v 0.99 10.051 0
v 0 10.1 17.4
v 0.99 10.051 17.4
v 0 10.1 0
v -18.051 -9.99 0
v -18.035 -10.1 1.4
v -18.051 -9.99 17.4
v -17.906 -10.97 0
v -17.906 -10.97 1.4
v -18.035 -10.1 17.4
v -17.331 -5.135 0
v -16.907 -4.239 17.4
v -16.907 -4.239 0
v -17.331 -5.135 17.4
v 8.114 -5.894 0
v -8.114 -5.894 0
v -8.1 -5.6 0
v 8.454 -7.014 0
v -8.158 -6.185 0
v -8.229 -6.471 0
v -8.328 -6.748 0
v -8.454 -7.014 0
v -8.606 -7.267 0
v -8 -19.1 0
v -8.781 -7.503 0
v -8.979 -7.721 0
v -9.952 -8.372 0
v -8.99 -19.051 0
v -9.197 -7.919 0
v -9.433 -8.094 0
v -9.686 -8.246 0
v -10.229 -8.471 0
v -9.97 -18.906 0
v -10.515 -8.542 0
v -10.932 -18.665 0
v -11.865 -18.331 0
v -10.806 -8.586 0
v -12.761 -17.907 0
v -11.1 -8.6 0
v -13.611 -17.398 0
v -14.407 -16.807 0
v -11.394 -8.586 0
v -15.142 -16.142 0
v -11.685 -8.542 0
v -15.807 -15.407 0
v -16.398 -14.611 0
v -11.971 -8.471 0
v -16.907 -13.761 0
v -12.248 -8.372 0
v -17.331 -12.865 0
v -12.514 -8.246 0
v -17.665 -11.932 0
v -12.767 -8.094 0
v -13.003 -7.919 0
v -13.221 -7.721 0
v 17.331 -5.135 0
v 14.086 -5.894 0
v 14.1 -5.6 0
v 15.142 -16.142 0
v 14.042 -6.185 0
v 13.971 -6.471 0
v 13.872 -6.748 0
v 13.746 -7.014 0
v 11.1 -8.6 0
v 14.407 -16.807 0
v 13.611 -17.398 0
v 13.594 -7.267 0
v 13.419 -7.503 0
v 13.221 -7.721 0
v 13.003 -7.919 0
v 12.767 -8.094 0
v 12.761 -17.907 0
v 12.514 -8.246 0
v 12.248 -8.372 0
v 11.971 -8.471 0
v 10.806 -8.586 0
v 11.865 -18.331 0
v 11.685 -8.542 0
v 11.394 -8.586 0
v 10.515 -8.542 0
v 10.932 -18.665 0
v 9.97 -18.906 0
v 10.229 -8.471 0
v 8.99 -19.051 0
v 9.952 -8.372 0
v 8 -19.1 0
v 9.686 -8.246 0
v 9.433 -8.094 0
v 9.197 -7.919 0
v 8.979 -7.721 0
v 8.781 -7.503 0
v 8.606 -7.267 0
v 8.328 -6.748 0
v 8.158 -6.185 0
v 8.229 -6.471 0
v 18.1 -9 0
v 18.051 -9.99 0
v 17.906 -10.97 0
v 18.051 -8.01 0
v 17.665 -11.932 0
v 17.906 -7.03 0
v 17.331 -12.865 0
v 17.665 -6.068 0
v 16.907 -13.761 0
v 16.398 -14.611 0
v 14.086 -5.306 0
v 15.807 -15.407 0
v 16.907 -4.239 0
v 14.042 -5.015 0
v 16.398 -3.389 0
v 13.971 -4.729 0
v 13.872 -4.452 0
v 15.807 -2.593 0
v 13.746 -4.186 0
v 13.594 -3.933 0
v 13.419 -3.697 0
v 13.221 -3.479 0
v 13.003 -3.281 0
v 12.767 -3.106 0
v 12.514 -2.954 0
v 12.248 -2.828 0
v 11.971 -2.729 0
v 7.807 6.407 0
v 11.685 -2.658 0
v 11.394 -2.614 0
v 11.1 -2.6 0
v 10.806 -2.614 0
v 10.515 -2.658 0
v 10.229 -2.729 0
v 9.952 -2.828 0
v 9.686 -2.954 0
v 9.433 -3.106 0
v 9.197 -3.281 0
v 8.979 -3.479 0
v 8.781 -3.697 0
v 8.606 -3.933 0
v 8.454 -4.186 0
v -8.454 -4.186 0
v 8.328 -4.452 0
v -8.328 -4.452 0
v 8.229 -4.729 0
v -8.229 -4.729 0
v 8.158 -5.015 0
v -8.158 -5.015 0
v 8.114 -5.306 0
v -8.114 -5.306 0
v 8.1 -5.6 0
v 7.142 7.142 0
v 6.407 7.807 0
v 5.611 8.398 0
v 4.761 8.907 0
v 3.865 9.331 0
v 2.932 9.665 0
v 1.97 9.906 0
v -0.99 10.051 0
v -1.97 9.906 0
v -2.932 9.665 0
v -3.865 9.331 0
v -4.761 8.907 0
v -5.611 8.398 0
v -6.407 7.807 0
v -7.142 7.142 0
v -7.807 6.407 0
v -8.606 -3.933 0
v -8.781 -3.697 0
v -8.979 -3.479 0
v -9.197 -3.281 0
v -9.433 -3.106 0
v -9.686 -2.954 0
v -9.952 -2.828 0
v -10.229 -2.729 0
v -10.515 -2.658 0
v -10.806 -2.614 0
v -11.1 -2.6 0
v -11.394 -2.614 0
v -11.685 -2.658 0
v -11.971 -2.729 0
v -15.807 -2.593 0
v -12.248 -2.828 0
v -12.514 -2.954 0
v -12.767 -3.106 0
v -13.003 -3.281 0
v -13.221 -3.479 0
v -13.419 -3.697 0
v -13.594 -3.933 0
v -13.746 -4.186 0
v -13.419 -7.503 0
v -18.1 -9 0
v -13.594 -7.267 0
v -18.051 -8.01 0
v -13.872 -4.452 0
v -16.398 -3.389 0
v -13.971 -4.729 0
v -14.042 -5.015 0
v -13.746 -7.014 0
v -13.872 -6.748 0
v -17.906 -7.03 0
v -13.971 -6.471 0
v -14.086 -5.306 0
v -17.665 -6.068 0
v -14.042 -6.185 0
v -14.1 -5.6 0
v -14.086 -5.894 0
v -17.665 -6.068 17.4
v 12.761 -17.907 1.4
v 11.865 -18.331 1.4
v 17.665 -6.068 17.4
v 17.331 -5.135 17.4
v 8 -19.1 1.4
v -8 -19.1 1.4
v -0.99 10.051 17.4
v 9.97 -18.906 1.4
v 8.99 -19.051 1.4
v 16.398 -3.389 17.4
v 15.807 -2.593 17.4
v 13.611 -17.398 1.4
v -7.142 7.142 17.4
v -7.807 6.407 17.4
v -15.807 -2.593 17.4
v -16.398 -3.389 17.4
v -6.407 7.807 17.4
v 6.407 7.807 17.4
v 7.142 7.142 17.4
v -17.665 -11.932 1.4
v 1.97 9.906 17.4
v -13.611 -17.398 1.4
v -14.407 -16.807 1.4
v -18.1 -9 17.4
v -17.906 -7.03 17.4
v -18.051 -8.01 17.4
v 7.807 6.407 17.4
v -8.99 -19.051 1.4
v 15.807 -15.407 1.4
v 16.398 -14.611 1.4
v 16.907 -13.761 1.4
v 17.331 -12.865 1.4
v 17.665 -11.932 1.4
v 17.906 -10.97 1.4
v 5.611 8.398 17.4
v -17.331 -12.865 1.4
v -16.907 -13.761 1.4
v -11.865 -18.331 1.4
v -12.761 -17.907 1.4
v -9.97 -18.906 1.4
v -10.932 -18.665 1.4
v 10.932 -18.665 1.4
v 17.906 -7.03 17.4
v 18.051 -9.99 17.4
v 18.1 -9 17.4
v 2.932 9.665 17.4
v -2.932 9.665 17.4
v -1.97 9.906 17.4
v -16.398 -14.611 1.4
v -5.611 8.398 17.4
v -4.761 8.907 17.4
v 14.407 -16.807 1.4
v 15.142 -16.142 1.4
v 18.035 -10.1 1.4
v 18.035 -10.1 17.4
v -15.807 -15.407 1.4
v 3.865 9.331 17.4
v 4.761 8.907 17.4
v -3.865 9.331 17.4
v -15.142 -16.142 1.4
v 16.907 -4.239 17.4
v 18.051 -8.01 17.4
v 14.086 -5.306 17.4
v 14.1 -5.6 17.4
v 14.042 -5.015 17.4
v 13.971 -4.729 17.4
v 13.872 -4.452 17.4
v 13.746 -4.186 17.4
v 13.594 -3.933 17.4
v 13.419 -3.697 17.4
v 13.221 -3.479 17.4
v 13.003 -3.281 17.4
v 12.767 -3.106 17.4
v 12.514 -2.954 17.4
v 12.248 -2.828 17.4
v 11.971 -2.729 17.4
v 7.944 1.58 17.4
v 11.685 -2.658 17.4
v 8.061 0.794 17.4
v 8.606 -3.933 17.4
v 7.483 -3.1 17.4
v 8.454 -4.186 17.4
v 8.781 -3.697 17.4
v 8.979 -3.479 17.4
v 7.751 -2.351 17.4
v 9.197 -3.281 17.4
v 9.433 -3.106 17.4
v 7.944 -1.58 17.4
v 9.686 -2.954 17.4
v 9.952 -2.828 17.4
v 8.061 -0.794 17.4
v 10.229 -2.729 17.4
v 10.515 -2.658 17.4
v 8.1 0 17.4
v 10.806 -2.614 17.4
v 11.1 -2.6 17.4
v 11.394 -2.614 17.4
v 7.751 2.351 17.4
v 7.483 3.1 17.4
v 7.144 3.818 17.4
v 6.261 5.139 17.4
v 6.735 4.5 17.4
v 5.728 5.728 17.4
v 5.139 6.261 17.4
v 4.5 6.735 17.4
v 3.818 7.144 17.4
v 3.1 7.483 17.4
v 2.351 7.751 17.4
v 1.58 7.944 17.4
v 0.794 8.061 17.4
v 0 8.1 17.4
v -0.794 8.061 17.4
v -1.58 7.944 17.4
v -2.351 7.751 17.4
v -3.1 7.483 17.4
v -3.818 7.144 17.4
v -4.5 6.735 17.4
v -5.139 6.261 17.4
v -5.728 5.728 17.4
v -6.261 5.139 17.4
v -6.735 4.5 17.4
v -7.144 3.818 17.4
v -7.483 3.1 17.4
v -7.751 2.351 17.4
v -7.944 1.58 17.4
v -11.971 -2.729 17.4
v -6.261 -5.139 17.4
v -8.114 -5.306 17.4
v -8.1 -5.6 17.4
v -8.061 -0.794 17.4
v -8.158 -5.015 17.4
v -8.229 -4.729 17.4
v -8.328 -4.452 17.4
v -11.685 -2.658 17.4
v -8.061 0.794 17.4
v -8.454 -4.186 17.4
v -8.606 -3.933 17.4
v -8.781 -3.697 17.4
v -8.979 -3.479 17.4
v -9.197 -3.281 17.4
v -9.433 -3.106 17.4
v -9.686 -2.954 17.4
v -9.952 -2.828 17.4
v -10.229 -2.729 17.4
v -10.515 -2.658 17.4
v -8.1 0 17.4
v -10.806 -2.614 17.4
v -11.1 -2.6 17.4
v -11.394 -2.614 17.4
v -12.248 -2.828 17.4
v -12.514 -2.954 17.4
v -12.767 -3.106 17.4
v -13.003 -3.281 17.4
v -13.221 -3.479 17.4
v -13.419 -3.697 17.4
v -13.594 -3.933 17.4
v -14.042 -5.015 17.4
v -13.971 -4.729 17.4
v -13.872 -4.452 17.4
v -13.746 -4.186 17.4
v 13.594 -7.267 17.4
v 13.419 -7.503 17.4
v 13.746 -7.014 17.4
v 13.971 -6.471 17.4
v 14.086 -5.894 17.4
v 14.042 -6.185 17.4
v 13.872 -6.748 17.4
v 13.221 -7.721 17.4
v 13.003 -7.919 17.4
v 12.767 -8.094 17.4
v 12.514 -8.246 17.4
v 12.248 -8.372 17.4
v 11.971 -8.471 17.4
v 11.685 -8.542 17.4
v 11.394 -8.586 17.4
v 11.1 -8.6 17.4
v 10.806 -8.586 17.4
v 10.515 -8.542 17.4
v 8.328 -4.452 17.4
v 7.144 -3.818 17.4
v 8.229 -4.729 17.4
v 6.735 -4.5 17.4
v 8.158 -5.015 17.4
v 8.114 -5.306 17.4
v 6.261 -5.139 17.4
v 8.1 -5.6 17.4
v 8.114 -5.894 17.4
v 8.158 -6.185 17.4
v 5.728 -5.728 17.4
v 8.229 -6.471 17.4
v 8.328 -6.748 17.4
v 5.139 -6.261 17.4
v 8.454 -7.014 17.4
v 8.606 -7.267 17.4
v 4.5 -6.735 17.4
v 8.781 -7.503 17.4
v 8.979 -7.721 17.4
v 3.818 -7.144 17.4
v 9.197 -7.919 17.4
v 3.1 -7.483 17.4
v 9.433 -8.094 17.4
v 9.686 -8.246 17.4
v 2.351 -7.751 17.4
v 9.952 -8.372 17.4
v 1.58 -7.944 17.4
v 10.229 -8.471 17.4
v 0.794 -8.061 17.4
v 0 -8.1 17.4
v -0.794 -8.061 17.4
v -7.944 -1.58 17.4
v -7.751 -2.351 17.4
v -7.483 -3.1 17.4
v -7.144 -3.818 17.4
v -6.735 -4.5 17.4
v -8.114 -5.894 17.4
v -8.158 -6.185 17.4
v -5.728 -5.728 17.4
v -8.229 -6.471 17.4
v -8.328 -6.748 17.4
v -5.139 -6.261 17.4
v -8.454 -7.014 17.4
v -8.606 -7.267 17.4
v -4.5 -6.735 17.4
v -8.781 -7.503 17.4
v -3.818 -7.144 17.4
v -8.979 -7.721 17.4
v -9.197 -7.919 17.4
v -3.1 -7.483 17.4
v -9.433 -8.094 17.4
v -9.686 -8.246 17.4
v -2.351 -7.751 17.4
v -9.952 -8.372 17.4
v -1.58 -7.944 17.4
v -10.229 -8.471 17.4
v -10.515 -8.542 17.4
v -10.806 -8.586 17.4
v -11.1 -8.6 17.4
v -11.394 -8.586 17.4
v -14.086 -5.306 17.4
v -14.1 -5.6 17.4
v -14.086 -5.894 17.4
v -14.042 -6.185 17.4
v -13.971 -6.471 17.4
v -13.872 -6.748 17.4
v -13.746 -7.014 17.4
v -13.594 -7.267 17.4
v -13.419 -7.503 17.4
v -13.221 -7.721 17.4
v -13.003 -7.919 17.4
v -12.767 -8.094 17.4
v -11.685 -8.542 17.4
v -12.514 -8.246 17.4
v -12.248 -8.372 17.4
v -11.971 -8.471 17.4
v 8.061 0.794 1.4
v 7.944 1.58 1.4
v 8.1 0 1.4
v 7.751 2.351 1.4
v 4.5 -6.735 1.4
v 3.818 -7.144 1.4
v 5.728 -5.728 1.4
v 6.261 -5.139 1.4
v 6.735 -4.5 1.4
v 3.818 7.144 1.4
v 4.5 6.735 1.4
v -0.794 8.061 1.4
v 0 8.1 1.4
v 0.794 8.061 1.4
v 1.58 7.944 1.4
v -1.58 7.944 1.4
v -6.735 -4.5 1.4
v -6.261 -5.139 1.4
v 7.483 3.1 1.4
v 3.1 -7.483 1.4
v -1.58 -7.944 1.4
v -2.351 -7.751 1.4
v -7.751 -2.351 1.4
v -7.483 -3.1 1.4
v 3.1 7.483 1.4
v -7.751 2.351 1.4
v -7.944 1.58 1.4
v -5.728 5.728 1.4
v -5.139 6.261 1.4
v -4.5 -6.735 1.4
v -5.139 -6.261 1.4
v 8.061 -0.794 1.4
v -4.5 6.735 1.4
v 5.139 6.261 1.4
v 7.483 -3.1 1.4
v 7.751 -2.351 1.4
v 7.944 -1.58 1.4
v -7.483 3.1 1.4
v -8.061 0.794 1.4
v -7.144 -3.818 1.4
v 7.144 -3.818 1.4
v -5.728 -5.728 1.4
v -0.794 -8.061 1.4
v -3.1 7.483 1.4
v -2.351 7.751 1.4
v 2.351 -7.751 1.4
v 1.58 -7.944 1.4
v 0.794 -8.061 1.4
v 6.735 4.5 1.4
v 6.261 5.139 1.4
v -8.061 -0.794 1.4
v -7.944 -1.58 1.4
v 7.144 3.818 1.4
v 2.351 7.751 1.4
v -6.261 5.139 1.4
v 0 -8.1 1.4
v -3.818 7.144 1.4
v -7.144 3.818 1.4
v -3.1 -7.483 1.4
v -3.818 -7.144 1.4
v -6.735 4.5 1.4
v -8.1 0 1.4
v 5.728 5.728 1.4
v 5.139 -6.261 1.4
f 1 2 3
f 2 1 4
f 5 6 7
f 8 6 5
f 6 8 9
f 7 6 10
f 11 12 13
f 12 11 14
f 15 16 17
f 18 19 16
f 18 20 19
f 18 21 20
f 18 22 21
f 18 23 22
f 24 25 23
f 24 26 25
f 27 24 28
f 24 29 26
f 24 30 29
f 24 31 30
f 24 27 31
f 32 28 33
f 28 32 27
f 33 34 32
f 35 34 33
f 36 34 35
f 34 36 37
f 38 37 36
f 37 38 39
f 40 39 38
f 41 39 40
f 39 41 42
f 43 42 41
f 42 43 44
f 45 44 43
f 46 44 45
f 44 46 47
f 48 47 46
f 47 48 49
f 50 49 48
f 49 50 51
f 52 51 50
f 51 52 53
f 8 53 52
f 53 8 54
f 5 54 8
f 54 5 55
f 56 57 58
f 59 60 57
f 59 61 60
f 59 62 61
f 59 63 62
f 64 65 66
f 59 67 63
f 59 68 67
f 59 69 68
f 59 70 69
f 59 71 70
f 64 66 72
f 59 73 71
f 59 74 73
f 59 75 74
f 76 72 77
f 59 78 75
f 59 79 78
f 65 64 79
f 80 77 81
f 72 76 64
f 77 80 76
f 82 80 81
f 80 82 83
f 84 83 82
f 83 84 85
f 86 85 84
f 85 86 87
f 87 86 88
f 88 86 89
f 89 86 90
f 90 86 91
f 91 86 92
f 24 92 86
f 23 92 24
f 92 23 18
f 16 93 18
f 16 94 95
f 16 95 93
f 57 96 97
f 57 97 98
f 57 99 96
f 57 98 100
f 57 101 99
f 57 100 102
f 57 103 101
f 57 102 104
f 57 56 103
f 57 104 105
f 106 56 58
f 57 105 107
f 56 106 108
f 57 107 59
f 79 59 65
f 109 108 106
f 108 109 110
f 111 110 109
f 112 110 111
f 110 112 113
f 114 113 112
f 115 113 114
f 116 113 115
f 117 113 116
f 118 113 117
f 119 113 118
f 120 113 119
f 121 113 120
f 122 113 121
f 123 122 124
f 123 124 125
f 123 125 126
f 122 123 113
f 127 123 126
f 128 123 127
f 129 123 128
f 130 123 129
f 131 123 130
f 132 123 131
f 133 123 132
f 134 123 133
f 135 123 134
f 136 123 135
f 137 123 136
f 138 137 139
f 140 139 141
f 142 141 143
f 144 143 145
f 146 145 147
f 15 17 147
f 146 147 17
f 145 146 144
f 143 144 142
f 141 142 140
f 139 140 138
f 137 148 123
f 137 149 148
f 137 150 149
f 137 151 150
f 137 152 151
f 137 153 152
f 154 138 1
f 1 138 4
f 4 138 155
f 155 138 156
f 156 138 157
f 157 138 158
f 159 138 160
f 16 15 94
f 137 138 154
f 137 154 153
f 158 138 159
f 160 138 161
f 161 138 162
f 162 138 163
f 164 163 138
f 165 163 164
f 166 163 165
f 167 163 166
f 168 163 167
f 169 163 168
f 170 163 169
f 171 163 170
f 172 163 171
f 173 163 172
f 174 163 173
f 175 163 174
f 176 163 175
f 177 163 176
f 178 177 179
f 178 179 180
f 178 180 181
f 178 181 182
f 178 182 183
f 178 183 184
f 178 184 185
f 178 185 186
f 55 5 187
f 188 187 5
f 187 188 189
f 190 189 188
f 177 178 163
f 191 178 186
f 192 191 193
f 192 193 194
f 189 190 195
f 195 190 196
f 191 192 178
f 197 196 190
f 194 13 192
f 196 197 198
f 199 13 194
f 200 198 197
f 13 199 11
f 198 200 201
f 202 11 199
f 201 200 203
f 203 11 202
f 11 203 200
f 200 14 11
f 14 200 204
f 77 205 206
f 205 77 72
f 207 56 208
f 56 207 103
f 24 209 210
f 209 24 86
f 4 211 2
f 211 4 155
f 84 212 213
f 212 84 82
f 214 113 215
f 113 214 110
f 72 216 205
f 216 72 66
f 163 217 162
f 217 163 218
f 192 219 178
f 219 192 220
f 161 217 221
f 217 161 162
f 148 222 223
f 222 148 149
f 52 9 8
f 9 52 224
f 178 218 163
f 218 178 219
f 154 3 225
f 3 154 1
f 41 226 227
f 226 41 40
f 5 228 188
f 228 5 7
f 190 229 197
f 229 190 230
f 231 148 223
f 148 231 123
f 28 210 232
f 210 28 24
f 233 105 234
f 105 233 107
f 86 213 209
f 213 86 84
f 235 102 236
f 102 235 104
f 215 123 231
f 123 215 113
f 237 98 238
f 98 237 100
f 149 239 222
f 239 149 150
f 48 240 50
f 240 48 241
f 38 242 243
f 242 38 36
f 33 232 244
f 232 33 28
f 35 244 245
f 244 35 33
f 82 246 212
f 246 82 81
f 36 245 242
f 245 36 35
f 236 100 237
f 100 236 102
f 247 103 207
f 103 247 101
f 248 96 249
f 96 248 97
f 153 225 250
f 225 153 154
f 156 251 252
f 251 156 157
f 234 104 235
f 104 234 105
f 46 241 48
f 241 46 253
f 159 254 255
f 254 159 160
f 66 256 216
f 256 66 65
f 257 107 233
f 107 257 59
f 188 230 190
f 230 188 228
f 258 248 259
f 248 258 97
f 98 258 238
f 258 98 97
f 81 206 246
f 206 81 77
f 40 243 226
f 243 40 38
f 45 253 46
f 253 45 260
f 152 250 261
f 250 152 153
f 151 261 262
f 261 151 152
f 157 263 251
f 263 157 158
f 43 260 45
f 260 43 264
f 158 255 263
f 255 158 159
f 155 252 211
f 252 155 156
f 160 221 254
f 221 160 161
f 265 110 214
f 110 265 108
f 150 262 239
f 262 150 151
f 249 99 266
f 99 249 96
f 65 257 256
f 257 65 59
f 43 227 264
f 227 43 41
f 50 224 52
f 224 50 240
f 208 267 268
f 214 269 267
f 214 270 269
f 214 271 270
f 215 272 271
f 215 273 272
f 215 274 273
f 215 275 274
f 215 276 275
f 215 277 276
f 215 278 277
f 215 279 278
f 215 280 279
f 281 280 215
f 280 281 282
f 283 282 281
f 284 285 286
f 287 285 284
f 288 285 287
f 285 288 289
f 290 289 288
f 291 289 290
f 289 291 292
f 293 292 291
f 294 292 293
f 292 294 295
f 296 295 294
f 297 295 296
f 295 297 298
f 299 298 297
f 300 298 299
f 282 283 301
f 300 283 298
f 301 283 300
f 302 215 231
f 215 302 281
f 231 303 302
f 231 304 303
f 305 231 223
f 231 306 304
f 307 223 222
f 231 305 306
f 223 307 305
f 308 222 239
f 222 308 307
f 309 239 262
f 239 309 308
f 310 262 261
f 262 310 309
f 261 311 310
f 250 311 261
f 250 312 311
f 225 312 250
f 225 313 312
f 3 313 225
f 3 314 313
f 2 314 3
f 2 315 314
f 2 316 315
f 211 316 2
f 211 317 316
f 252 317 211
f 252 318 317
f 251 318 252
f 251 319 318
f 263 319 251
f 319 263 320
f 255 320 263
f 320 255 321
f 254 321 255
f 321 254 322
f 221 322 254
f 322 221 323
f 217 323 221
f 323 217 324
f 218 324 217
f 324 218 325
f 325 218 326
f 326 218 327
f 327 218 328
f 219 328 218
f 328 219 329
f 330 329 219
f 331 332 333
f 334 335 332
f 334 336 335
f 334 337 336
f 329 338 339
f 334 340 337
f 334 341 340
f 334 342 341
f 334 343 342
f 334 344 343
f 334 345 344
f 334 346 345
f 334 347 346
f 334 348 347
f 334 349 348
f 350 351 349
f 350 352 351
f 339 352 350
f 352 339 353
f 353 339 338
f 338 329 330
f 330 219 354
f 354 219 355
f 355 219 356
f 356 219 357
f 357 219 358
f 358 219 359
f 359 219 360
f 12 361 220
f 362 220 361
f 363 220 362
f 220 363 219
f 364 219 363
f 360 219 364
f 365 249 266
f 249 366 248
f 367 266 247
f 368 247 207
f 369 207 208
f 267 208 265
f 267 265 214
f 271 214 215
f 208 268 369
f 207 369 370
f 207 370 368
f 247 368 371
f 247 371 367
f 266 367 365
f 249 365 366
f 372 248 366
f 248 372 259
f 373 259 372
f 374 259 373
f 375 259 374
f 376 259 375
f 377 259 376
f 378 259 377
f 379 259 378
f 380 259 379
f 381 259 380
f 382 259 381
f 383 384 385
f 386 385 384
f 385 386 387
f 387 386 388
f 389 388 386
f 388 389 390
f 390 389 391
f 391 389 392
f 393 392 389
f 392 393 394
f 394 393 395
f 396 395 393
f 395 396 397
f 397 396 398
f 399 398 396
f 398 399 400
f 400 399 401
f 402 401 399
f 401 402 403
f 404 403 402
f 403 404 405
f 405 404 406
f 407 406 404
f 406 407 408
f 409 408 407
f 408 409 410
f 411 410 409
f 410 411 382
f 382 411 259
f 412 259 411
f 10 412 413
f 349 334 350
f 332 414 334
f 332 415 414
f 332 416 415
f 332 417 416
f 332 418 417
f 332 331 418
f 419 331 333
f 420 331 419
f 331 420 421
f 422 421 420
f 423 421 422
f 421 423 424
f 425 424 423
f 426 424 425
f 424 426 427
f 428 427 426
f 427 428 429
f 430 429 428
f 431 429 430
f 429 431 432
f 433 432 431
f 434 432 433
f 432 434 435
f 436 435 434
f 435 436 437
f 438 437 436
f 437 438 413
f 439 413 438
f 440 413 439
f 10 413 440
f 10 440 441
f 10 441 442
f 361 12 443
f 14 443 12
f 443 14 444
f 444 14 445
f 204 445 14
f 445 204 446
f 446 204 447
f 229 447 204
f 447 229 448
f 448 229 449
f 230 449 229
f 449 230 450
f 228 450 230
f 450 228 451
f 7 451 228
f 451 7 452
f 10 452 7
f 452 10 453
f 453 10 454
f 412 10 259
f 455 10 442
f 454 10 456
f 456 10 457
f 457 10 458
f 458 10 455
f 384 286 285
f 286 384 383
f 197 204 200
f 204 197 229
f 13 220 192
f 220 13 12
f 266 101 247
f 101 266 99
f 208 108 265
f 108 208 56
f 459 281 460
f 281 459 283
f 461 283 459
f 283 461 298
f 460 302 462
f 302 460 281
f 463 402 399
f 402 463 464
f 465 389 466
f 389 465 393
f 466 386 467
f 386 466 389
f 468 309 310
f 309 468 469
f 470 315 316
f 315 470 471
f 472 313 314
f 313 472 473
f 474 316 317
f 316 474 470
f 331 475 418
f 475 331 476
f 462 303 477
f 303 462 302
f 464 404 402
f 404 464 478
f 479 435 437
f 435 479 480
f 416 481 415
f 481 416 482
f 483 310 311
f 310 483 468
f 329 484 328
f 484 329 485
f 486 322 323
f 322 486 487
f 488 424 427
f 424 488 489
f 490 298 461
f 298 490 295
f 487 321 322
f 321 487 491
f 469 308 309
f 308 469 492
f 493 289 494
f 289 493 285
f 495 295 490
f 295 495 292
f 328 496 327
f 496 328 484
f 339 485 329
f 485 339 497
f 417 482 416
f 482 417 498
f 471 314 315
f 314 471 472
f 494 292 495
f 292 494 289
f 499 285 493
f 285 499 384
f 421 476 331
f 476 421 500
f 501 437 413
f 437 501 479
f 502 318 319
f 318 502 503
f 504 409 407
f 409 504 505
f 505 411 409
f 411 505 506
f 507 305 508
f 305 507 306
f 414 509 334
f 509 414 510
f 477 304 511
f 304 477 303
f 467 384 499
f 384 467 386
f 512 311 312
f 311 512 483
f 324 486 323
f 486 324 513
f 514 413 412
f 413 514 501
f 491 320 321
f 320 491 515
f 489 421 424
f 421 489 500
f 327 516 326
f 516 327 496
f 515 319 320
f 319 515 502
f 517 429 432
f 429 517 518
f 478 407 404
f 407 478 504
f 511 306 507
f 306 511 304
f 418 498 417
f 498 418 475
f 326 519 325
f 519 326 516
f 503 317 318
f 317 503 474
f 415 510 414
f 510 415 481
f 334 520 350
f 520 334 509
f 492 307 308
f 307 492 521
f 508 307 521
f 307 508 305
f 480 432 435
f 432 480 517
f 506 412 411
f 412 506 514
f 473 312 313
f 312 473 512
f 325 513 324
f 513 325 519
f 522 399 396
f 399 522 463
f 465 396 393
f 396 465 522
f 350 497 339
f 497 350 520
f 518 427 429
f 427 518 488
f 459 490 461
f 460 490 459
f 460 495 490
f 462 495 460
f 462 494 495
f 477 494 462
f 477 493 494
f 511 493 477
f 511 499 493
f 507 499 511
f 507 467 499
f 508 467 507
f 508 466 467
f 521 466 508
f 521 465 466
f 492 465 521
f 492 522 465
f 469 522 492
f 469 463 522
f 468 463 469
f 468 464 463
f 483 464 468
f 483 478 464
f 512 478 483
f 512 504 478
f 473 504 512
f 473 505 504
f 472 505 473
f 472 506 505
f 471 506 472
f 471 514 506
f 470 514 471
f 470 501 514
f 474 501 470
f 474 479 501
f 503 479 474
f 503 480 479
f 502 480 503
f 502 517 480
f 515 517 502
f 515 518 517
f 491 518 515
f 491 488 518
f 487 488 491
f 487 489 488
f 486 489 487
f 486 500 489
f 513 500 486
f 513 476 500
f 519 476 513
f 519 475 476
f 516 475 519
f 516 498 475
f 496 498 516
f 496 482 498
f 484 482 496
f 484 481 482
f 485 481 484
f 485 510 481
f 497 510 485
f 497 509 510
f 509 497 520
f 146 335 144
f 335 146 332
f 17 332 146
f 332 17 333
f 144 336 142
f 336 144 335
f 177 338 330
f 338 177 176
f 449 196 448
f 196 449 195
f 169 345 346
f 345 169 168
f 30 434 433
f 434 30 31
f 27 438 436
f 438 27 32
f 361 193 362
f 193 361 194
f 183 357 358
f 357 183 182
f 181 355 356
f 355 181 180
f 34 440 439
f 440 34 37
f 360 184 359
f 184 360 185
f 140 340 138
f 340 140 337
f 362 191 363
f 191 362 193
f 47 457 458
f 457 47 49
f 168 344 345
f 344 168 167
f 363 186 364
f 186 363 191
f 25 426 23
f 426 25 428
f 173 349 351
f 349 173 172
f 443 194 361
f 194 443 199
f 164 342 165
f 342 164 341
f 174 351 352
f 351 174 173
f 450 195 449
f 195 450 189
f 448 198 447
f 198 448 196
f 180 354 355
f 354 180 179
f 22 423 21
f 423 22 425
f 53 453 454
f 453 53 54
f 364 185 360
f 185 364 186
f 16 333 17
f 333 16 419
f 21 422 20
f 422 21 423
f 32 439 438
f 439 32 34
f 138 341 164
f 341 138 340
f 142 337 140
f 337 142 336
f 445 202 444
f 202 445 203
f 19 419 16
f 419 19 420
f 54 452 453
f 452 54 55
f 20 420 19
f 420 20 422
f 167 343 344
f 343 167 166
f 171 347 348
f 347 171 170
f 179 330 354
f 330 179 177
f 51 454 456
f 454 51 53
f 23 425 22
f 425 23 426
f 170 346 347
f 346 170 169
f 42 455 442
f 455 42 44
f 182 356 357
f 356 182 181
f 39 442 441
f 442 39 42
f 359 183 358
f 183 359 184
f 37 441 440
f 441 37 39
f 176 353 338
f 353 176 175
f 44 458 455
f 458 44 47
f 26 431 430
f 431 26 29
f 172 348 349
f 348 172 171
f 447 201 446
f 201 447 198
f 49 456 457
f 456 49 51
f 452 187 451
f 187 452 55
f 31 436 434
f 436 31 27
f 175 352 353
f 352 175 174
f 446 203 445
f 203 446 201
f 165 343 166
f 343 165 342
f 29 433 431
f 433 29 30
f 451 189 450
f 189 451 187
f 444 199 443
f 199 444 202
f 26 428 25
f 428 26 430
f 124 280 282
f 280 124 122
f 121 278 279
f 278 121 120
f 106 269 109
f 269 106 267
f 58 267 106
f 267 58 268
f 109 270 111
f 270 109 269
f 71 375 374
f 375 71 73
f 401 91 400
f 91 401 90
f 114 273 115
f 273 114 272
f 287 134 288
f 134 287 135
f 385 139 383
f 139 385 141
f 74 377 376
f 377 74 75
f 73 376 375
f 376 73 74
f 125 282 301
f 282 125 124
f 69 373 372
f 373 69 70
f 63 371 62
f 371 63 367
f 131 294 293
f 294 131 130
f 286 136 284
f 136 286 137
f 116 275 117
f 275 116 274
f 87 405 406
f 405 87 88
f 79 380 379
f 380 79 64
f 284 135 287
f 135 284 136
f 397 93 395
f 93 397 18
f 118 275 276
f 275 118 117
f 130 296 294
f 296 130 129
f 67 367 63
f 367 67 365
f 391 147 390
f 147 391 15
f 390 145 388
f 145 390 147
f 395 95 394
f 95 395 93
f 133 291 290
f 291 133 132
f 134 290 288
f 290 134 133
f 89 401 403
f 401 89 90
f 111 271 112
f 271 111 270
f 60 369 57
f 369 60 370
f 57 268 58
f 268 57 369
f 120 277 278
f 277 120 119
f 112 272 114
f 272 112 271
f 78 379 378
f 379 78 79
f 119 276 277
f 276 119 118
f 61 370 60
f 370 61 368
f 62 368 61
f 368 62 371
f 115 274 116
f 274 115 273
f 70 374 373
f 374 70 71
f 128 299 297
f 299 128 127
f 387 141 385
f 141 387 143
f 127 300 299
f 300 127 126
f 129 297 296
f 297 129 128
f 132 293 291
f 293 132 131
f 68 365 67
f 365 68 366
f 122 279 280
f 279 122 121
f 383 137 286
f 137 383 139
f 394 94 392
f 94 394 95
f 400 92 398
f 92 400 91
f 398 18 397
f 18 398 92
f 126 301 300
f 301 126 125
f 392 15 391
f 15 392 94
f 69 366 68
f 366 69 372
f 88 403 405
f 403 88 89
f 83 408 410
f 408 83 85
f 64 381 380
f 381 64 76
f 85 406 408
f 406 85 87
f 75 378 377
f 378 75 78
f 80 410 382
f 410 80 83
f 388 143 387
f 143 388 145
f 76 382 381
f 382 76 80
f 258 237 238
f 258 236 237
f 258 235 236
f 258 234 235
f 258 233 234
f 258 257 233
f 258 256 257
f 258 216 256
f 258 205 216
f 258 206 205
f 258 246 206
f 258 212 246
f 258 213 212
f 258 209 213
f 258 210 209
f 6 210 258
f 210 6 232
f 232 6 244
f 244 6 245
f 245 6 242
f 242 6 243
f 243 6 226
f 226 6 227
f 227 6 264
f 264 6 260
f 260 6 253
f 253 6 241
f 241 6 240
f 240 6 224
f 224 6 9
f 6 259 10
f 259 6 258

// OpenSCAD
/* [Base] */
// Select part for display, change settings for each part below
part = "Connector"; // [Connector, BatteryTray, SurfaceMount]

// Diameter of your base dowel
holeCenter = 16.2; // [10:0.1:50]
// Thickness of the wall around the dowel
wallThickness = 2; // [0.8:0.1:10]
// Thickness of the top and bottom shells
bottom = 1.4; // [0.5:0.1:10]

/* [Connector] */
// Height should be a little bit less than the diameter of what you are using for the hoop
height = 16; // [5:1:100]
// Hole diameter for zip tie
holeZip = 6; // [0:1:10]

/* [Battery Tray] */
// Length of th battery tray
batteryLength = 15; // [2:1:100]
// Width of the battery tray
batteryWidth = 35; // [10:1:100]
// Width of Zip tie
widthZip = 4; // [0:1:10]
// Roundness of corners
roundness = 2; // [0:1:2]

/* [Surface mount] */
flapWidth = 15; // [5:1:100]
mountHeight  = 10; // [5:1:100]

/* [Hidden] */
connectorHeight = mountHeight;
tapeWidth = flapWidth;
hole = holeCenter;
zip = holeZip;
walls = wallThickness;
$fn = 64;
holeRadius = hole / 2;
zipRadius = zip / 2;
xOffset = 8;
yOffset = 9;

totalHeight = height + bottom;
batteryHeight = bottom * 2 + zip;
batteryWidthOuter = batteryWidth + bottom * 2;

if(part == "Connector") gate();
if(part == "BatteryTray") rotate([0, 0, 180]) battery();
if(part == "SurfaceMount") connector();

module connector() {
    group() {
        hull() {
            cylinder(r = holeRadius + walls, h = bottom);

            translate([tapeWidth + holeRadius + walls - 1, 0, bottom / 2])
                cube([1, 5, bottom], center = true);
            
            translate([-tapeWidth - holeRadius - walls + 1, 0, bottom / 2])
                cube([1, 5, bottom], center = true);
        }

        difference() {
            cylinder(r = holeRadius + walls, h = bottom + connectorHeight);

            translate([0, 0, bottom])
                cylinder(r = holeRadius, h = bottom + connectorHeight);
        }

        translate([tapeWidth + holeRadius + walls, 0, bottom])
            cube([bottom, 5, bottom * 2], center = true);

        translate([-tapeWidth - holeRadius - walls  , 0, bottom])
            cube([bottom, 5, bottom * 2], center = true);
    }
}

module battery() {
    difference(){
        difference() {
            hull() {
                cylinder(r = holeRadius + walls, h = batteryHeight);
                
                translate([-batteryWidthOuter / 2, holeRadius + walls, 0])
                    cube([batteryWidthOuter, batteryLength, batteryHeight / 2]);
                
                
                translate([-batteryWidthOuter / 2, holeRadius + walls + batteryLength - roundness, bottom * 2 + zip -  roundness])
                    rotate([0, 90, 0])
                        cylinder(r=roundness, h = batteryWidthOuter);
                
                translate([-batteryWidthOuter / 2, holeRadius + walls, batteryHeight / 2])
                        cube([batteryWidthOuter, batteryLength - roundness, batteryHeight / 2]);
            }
            
            translate([0, 0, -1])
                cylinder(r = holeRadius, h = totalHeight + 2);
            
            translate([-batteryWidthOuter / 2 + bottom, holeRadius + walls, bottom])
                    cube([batteryWidth, batteryLength + 1, batteryHeight]);
        }
    
         translate([0, 0, bottom]) {
             difference() {          
                 translate([0, -holeRadius + walls + 1, 0])
                    cylinder(r = holeRadius * 2, h = zip);

                 translate([0, -holeRadius + walls + 1, 0])
                    cylinder(r = holeRadius * 2 - widthZip, h = zip); 
            }
        }
    }
}

module gate() {
    difference() {
        hull() {
            cylinder(r = holeRadius + walls, h = totalHeight);

            translate([-xOffset, -yOffset, 0])
                cylinder(r = holeRadius + walls, h = totalHeight);
                
            translate([xOffset, -yOffset, 0])
                cylinder(r = holeRadius + walls, h = totalHeight);  
        }
        
        translate([0, 0, bottom])
            cylinder(r = holeRadius, h = totalHeight + 2);
        
        translate([-zipRadius - holeRadius, -holeRadius  + zip / 2 - 0.5, -1])
            cylinder(r = zipRadius, h = totalHeight + 2);

        translate([holeRadius + zipRadius, -holeRadius  + zip / 2 - 0.5, -1])
            cylinder(r = zipRadius, h = totalHeight + 2);
        
        translate([-50, -100 - holeRadius - walls, bottom])
            cube([100, 100, totalHeight]);
    }
}
